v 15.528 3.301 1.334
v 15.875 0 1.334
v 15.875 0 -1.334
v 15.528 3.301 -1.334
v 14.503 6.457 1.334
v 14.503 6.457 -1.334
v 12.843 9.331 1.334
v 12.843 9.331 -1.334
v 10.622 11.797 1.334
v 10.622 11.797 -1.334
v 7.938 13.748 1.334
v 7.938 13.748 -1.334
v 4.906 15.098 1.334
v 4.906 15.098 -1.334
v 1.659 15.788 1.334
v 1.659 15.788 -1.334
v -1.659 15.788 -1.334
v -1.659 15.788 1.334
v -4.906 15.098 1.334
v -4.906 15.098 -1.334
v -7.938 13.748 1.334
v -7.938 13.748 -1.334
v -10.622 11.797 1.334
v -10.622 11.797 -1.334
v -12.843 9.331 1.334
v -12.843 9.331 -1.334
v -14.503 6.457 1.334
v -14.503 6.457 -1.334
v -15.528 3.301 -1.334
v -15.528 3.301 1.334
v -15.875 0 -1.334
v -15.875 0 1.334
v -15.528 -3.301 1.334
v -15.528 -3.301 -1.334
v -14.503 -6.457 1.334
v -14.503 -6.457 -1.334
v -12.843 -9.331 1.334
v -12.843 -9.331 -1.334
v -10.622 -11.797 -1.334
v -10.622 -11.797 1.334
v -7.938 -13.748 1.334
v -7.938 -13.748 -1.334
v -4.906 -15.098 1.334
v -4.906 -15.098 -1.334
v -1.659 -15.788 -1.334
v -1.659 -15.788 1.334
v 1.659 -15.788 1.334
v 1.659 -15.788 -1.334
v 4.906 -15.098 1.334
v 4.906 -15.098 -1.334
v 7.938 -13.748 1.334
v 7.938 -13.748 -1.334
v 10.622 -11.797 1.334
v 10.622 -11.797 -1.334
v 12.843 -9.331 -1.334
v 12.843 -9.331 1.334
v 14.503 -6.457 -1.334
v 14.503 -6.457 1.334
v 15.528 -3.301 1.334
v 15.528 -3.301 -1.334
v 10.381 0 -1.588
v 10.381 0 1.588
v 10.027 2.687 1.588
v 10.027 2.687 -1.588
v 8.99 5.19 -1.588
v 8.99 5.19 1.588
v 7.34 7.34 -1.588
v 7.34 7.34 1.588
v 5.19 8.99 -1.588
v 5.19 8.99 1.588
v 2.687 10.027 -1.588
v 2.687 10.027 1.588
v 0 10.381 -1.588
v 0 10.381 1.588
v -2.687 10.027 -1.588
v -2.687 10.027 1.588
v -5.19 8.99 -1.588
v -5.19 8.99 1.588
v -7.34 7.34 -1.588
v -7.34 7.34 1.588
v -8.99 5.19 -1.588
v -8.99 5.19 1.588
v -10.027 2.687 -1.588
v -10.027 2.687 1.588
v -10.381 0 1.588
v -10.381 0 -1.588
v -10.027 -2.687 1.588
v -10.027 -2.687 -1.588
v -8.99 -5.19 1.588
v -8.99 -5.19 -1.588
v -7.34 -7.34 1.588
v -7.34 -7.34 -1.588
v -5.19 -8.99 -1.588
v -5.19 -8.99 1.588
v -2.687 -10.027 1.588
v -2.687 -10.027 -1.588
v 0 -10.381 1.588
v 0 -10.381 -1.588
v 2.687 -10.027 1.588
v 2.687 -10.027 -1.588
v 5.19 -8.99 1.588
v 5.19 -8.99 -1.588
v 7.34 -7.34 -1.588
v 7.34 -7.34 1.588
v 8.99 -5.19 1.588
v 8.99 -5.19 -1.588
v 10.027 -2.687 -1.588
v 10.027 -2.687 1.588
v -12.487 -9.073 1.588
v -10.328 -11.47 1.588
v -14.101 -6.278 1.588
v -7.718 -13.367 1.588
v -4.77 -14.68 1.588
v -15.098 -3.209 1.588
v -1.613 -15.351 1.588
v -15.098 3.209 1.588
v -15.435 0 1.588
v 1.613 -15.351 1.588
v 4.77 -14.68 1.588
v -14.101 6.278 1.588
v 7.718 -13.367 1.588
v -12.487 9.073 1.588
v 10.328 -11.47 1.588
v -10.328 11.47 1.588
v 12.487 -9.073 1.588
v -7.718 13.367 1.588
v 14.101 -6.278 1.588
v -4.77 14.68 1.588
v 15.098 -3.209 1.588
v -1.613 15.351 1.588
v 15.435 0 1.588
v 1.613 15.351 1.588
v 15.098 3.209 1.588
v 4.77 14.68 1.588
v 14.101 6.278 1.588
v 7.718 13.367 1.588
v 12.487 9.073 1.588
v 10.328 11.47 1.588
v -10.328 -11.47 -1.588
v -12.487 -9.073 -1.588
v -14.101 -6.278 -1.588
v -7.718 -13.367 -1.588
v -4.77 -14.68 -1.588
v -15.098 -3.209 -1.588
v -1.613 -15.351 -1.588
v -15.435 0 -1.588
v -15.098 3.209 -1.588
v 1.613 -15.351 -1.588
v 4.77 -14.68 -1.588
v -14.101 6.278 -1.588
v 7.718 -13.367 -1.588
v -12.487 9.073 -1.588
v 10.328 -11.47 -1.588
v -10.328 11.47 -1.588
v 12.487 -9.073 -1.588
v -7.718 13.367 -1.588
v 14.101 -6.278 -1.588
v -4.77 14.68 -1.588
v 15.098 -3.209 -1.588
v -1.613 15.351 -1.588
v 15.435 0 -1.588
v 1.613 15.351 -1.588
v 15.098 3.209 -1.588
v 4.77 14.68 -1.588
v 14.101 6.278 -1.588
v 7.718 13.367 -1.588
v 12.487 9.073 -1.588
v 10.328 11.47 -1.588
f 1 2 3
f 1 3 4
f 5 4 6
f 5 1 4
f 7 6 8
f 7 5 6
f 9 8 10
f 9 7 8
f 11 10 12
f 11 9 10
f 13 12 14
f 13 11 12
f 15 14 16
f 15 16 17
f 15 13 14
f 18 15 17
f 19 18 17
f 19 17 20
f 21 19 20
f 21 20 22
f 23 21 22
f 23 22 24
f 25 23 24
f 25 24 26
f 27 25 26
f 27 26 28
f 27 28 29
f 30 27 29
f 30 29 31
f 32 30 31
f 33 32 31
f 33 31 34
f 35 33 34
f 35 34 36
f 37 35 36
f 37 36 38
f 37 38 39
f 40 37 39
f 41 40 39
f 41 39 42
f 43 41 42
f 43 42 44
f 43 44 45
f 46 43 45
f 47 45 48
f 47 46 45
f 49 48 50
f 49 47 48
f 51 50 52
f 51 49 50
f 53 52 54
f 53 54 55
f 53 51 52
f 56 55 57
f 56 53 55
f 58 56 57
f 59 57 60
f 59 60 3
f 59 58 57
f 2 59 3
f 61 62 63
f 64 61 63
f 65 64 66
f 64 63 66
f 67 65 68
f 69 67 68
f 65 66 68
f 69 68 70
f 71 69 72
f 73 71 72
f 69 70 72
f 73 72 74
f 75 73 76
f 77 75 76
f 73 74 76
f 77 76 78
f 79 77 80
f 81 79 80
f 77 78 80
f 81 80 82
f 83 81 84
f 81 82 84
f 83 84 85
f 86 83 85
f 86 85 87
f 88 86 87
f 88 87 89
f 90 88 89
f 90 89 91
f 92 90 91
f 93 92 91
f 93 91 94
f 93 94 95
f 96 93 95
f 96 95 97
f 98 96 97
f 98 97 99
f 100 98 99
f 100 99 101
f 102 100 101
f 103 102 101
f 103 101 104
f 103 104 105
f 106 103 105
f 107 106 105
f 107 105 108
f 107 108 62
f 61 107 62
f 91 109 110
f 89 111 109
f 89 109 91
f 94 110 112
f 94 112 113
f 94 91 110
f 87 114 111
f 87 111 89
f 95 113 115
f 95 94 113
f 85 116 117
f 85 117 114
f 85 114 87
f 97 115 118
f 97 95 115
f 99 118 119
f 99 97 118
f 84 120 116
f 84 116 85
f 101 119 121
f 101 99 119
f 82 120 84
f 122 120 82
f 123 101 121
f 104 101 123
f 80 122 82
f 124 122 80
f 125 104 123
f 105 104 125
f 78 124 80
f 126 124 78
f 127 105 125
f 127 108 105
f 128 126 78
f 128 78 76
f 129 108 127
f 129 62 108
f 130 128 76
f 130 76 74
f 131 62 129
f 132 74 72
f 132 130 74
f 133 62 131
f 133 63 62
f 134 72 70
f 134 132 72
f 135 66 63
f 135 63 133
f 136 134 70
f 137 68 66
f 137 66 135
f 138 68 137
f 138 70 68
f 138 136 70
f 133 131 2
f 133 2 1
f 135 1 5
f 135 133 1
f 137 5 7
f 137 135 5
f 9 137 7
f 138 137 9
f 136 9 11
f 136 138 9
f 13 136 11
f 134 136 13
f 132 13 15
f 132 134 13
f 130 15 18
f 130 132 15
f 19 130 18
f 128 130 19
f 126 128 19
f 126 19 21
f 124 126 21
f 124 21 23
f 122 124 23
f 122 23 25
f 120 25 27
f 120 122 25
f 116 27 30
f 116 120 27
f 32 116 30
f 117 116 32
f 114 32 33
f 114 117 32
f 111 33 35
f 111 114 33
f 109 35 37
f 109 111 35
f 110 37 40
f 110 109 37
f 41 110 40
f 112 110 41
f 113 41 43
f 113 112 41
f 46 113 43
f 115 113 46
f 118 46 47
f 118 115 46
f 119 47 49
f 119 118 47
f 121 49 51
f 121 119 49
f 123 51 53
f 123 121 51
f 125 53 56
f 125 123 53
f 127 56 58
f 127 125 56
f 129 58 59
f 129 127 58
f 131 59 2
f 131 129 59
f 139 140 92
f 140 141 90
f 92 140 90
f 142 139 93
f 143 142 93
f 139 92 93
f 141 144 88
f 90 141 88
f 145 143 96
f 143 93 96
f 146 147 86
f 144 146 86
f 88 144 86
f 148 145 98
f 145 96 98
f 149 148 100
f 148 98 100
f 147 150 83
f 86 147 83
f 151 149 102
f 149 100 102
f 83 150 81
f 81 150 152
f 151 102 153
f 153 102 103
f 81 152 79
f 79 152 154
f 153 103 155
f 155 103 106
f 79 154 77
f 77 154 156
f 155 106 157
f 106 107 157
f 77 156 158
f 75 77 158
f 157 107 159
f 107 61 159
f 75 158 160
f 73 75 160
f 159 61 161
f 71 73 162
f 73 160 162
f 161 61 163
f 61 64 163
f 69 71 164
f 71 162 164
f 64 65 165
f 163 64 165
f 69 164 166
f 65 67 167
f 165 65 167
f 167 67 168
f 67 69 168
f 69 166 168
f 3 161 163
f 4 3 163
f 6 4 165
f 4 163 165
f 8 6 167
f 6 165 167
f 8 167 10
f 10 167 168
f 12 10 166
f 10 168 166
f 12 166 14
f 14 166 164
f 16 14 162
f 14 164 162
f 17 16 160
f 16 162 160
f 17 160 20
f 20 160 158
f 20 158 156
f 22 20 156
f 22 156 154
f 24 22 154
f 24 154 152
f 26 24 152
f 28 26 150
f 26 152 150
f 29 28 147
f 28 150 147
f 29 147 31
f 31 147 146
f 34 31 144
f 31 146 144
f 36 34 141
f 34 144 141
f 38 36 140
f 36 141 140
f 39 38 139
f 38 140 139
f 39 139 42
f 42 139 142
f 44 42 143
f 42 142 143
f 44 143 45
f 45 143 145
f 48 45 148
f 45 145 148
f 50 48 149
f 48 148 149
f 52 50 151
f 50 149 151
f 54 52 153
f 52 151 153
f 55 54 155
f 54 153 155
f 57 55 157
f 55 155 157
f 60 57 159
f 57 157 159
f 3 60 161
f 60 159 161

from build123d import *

# Parameters (mm, degrees)
SKETCH3_R                = 15.875
SKETCH3_R_2              = 9.5504
BOSS_EXTRUDE1_DEPTH      = 1.5875
BOSS_EXTRUDE1_DEPTH_BACK = 1.5875
CHAMFER1_SIZE            = 0.254
CHAMFER1_SIZE2           = 0.439940905
CHAMFER1_PART_2_SIZE     = 0.254
CHAMFER1_PART_2_SIZE2    = 0.439940905
CHAMFER2_SIZE            = 0.254
CHAMFER2_SIZE2           = 0.495866606
SKETCH5_R                = 10.380999939
CUT_EXTRUDE1_DEPTH       = 4.1750001


with BuildPart() as part:
    # Sketch3 → Boss-Extrude1 (new body, two sides)
    with BuildSketch(Plane.XY) as boss_extrude1_sk:
        Circle(SKETCH3_R)
        Circle(SKETCH3_R_2, mode=Mode.SUBTRACT)
    extrude(amount=BOSS_EXTRUDE1_DEPTH)
    extrude(boss_extrude1_sk.sketch, amount=-BOSS_EXTRUDE1_DEPTH_BACK)

    # Chamfer1
    chamfer1_edges = [part.edges().sort_by_distance(p)[0] for p in [
        (-15.875, 0, 1.5875),
    ]]
    chamfer1_side = [part.faces().sort_by_distance(p)[0] for p in [
        (-15.875, 0, 0.79375),
    ]]
    chamfer(chamfer1_edges, length=CHAMFER1_SIZE, length2=CHAMFER1_SIZE2, reference=chamfer1_side[0])

    # Chamfer1 part 2
    chamfer1_part_2_edges = [part.edges().sort_by_distance(p)[0] for p in [
        (-15.875, 0, -1.5875),
    ]]
    chamfer1_part_2_side = [part.faces().sort_by_distance(p)[0] for p in [
        (-15.875, 0, -0.79375),
    ]]
    chamfer(chamfer1_part_2_edges, length=CHAMFER1_PART_2_SIZE, length2=CHAMFER1_PART_2_SIZE2, reference=chamfer1_part_2_side[0])

    # Sketch4 → Cut-Revolve1 (revolve, cut)
    with BuildSketch(Plane(origin=(0, 0, 0), x_dir=(0, 0, -1), z_dir=(1, 0, 0))):
        with BuildLine():
            Line((-1.5875, 9.4996), (-1.5875, 9.6012))
            ThreePointArc((-1.5875, 9.6012), (0, 9.5504), (1.5875, 9.6012))
            Line((1.5875, 9.6012), (1.5875, 9.4996))
            Line((1.5875, 9.4996), (-1.5875, 9.4996))
        make_face()
    revolve(axis=Axis((0, 0, 1.5875), (0, 0, -1)), mode=Mode.SUBTRACT)

    # Chamfer2
    chamfer2_edges = [part.edges().sort_by_distance(p)[0] for p in [
        (0, -9.6012, -1.5875),
        (0, -9.6012, 1.5875),
    ]]
    chamfer2_side = [part.faces().sort_by_distance(p)[0] for p in [
        (0, -9.5504, 0),
    ]]
    chamfer(chamfer2_edges, length=CHAMFER2_SIZE, length2=CHAMFER2_SIZE2, reference=chamfer2_side[0])

    # Sketch5 → Cut-Extrude1 (cut, through all)
    with BuildSketch(Plane.XY.offset(1.5875)):
        Circle(SKETCH5_R)
    extrude(amount=-CUT_EXTRUDE1_DEPTH, mode=Mode.SUBTRACT)


solid = part.part
